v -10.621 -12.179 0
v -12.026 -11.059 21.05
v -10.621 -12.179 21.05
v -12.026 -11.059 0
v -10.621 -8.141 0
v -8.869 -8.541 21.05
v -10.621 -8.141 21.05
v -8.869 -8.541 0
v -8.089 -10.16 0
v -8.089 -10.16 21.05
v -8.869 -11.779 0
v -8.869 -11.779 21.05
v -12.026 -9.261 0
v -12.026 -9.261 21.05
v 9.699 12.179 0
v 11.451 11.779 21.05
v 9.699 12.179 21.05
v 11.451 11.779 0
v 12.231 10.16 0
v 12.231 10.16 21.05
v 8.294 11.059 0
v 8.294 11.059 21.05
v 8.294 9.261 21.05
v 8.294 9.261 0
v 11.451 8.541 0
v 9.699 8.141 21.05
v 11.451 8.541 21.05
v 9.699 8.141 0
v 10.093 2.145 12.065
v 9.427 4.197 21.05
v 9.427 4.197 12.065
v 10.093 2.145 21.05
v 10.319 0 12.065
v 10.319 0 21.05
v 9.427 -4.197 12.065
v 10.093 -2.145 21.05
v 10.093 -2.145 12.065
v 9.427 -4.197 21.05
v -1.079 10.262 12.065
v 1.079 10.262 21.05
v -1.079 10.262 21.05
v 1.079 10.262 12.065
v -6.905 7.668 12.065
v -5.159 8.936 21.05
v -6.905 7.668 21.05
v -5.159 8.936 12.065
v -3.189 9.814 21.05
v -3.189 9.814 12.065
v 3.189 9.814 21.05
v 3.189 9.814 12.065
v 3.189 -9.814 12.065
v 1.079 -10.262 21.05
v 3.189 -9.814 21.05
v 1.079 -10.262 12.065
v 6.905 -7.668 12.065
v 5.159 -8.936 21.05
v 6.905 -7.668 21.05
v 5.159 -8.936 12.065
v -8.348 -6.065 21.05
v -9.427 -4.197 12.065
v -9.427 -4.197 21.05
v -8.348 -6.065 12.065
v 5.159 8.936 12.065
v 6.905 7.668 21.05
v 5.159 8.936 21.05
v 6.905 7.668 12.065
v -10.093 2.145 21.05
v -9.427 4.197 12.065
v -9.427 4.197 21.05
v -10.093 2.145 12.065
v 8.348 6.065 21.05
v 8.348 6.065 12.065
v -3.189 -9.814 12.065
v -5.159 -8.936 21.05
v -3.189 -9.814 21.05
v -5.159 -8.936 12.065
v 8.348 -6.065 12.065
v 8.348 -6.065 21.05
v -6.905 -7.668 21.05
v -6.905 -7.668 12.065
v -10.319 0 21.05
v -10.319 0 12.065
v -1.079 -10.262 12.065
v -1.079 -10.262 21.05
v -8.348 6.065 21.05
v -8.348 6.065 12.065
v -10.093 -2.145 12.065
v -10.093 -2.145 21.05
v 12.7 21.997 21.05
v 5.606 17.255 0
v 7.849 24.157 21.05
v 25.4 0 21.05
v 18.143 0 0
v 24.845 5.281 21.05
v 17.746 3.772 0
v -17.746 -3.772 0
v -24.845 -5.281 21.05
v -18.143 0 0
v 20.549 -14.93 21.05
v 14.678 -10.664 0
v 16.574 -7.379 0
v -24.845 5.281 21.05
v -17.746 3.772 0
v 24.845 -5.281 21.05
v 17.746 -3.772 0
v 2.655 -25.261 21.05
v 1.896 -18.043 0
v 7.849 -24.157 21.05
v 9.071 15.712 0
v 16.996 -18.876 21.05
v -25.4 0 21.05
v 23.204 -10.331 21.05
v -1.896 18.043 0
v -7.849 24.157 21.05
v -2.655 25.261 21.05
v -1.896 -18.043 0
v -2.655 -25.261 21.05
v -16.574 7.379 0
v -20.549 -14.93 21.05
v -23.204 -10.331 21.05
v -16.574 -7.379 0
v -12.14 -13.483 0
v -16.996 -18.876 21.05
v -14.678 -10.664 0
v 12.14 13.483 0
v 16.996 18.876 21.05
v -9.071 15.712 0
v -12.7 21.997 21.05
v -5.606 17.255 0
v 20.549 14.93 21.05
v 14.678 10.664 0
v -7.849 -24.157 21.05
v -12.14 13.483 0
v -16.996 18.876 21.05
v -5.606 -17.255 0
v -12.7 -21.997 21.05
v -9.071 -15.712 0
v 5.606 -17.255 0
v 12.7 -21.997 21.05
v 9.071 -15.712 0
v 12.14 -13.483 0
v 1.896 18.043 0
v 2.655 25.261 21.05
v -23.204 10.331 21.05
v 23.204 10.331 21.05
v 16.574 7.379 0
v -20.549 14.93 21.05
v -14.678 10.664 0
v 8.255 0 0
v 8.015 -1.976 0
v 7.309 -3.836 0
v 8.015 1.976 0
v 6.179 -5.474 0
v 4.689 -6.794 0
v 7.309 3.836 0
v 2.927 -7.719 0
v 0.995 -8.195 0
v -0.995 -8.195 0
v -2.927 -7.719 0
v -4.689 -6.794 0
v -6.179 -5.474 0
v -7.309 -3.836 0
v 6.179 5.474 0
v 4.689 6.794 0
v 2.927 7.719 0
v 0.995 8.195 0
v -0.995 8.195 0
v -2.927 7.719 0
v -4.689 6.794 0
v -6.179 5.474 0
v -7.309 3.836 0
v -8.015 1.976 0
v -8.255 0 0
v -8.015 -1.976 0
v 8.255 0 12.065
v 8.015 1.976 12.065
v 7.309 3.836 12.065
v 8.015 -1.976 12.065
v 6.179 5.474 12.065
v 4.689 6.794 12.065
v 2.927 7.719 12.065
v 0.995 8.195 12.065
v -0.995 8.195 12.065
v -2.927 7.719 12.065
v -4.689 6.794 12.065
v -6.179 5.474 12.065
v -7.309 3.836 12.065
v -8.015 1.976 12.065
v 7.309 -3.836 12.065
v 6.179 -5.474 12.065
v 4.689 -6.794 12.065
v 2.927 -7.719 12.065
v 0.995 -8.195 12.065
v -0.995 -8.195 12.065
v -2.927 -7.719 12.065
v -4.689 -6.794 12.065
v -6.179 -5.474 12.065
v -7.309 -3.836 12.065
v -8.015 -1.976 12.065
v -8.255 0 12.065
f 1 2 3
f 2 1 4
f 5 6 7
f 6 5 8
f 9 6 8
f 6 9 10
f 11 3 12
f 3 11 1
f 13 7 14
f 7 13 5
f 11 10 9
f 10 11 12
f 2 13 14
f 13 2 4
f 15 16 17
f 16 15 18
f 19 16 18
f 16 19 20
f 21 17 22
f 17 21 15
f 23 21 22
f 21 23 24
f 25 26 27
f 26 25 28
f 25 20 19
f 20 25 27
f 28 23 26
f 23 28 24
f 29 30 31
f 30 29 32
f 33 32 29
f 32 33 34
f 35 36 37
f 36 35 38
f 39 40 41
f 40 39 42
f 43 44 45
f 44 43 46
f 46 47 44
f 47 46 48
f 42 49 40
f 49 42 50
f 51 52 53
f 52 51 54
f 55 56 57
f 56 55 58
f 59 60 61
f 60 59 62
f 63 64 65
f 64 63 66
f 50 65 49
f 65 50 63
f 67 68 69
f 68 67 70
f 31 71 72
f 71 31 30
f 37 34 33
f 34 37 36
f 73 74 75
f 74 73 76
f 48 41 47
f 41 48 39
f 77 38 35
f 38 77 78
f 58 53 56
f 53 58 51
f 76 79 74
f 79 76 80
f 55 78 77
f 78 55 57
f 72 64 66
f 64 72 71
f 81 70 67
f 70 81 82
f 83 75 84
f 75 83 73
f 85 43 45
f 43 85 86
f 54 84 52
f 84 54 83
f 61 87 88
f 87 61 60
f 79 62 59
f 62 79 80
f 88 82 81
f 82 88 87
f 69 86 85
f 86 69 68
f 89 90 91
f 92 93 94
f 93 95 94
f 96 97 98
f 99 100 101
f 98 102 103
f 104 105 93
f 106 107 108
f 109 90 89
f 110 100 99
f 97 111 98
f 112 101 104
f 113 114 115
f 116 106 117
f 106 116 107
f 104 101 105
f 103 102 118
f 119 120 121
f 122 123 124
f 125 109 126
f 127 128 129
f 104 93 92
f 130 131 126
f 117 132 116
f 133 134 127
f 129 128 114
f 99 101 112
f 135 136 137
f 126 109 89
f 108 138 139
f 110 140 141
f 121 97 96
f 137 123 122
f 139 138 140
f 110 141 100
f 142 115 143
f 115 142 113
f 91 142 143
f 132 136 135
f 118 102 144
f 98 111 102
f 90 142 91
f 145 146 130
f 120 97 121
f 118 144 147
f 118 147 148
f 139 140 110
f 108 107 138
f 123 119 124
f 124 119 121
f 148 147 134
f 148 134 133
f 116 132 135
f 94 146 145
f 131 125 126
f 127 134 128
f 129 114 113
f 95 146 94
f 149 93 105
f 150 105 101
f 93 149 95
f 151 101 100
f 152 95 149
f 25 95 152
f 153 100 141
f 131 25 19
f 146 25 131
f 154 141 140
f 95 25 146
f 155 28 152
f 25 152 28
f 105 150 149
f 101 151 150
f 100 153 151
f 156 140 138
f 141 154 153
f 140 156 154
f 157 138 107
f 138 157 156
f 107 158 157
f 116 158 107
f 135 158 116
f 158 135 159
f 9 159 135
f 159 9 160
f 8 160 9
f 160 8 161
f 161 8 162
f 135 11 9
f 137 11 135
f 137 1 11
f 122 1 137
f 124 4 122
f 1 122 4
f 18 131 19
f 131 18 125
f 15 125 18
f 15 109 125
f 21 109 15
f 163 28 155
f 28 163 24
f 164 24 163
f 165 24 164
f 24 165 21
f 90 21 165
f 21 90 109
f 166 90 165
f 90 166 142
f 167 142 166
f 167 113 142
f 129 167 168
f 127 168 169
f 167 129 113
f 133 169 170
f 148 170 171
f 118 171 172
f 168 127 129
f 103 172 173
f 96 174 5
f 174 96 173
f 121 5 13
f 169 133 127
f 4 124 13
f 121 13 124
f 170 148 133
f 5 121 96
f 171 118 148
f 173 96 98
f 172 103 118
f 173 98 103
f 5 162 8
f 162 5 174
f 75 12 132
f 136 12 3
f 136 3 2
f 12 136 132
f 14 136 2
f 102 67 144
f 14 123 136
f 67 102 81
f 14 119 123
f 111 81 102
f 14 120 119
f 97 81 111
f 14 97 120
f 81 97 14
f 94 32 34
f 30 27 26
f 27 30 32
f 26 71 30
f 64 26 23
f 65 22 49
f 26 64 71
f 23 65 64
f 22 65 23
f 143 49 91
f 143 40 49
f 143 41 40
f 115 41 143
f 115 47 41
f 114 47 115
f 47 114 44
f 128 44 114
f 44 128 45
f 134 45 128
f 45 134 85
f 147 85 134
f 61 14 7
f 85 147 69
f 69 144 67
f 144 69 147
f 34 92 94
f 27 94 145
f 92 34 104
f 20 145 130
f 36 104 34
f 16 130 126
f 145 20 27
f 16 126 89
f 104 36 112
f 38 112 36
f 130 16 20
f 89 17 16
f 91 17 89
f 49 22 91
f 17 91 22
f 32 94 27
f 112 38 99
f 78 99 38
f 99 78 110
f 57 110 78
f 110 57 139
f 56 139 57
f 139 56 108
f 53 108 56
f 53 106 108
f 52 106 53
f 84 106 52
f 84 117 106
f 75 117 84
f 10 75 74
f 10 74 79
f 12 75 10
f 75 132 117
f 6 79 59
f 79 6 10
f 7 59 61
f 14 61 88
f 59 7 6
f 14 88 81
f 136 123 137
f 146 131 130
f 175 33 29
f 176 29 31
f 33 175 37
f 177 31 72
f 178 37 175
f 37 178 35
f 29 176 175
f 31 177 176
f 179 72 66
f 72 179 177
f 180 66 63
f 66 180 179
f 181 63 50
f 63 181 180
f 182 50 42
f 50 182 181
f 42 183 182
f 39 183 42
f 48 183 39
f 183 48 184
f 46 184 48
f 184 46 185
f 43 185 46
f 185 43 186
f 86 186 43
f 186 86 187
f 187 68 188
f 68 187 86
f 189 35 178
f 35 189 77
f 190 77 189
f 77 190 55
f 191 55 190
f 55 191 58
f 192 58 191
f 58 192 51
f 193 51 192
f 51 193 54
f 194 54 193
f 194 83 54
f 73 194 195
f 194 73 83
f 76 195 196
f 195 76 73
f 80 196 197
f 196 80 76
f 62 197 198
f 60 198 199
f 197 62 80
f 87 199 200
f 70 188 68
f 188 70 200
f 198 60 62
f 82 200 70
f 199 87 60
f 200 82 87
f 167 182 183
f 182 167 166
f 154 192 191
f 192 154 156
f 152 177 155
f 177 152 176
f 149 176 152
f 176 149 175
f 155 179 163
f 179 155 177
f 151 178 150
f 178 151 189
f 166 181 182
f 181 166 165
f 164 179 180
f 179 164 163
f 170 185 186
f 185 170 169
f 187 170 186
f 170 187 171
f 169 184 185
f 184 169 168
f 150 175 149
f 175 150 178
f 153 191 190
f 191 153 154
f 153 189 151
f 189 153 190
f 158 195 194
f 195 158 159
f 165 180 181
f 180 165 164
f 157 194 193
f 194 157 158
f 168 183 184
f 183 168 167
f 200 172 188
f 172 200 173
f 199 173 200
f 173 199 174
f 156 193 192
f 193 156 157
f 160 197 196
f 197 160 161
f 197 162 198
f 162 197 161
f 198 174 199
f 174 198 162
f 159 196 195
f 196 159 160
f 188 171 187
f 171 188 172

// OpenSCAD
function mm(i) = i*25.4; 
    tubediam = mm(1.5); //diameter of the cardboard tube at the center
	 thickness= mm(.75); // thickness of material
	 boltwidth = mm(.1631); // desired diameter of bolt holes
	 bearingdiam = mm(.8125);
	 bearingheight = mm(.275);



module tubehold(tubediam=mm(2),thickness=mm(.75), boltwidth=mm(.1631),bearingdiam=mm(.8125), bearingheight = mm(.275))
    {
		union()
		{	
			difference()
			{	
			cylinder(thickness+2, (tubediam-(tubediam/(3.5)))/2, tubediam/2, 0);
				union()
					{				
					translate([-tubediam/5, -tubediam/5, -1])
						{
							cylinder(thickness+4, boltwidth/2, boltwidth/2, 0);
						}
					
					translate([tubediam/5, tubediam/5, -1])
						{
							cylinder(thickness+4, boltwidth/2, boltwidth/2, 0);
						}
					translate([0, 0, -1])
						{
							cylinder(thickness+4, bearingdiam/2, bearingdiam/2, 0);
						}
					}
				}
			difference()
				{	
					cylinder(thickness-bearingheight, bearingdiam/2, bearingdiam/2, 0);	
				translate([0, 0, -1])
					{
						cylinder(thickness-bearingheight+4, bearingdiam/2.5, bearingdiam/2.5, 0);
					}	
			}
		}
	 }

tubehold();
